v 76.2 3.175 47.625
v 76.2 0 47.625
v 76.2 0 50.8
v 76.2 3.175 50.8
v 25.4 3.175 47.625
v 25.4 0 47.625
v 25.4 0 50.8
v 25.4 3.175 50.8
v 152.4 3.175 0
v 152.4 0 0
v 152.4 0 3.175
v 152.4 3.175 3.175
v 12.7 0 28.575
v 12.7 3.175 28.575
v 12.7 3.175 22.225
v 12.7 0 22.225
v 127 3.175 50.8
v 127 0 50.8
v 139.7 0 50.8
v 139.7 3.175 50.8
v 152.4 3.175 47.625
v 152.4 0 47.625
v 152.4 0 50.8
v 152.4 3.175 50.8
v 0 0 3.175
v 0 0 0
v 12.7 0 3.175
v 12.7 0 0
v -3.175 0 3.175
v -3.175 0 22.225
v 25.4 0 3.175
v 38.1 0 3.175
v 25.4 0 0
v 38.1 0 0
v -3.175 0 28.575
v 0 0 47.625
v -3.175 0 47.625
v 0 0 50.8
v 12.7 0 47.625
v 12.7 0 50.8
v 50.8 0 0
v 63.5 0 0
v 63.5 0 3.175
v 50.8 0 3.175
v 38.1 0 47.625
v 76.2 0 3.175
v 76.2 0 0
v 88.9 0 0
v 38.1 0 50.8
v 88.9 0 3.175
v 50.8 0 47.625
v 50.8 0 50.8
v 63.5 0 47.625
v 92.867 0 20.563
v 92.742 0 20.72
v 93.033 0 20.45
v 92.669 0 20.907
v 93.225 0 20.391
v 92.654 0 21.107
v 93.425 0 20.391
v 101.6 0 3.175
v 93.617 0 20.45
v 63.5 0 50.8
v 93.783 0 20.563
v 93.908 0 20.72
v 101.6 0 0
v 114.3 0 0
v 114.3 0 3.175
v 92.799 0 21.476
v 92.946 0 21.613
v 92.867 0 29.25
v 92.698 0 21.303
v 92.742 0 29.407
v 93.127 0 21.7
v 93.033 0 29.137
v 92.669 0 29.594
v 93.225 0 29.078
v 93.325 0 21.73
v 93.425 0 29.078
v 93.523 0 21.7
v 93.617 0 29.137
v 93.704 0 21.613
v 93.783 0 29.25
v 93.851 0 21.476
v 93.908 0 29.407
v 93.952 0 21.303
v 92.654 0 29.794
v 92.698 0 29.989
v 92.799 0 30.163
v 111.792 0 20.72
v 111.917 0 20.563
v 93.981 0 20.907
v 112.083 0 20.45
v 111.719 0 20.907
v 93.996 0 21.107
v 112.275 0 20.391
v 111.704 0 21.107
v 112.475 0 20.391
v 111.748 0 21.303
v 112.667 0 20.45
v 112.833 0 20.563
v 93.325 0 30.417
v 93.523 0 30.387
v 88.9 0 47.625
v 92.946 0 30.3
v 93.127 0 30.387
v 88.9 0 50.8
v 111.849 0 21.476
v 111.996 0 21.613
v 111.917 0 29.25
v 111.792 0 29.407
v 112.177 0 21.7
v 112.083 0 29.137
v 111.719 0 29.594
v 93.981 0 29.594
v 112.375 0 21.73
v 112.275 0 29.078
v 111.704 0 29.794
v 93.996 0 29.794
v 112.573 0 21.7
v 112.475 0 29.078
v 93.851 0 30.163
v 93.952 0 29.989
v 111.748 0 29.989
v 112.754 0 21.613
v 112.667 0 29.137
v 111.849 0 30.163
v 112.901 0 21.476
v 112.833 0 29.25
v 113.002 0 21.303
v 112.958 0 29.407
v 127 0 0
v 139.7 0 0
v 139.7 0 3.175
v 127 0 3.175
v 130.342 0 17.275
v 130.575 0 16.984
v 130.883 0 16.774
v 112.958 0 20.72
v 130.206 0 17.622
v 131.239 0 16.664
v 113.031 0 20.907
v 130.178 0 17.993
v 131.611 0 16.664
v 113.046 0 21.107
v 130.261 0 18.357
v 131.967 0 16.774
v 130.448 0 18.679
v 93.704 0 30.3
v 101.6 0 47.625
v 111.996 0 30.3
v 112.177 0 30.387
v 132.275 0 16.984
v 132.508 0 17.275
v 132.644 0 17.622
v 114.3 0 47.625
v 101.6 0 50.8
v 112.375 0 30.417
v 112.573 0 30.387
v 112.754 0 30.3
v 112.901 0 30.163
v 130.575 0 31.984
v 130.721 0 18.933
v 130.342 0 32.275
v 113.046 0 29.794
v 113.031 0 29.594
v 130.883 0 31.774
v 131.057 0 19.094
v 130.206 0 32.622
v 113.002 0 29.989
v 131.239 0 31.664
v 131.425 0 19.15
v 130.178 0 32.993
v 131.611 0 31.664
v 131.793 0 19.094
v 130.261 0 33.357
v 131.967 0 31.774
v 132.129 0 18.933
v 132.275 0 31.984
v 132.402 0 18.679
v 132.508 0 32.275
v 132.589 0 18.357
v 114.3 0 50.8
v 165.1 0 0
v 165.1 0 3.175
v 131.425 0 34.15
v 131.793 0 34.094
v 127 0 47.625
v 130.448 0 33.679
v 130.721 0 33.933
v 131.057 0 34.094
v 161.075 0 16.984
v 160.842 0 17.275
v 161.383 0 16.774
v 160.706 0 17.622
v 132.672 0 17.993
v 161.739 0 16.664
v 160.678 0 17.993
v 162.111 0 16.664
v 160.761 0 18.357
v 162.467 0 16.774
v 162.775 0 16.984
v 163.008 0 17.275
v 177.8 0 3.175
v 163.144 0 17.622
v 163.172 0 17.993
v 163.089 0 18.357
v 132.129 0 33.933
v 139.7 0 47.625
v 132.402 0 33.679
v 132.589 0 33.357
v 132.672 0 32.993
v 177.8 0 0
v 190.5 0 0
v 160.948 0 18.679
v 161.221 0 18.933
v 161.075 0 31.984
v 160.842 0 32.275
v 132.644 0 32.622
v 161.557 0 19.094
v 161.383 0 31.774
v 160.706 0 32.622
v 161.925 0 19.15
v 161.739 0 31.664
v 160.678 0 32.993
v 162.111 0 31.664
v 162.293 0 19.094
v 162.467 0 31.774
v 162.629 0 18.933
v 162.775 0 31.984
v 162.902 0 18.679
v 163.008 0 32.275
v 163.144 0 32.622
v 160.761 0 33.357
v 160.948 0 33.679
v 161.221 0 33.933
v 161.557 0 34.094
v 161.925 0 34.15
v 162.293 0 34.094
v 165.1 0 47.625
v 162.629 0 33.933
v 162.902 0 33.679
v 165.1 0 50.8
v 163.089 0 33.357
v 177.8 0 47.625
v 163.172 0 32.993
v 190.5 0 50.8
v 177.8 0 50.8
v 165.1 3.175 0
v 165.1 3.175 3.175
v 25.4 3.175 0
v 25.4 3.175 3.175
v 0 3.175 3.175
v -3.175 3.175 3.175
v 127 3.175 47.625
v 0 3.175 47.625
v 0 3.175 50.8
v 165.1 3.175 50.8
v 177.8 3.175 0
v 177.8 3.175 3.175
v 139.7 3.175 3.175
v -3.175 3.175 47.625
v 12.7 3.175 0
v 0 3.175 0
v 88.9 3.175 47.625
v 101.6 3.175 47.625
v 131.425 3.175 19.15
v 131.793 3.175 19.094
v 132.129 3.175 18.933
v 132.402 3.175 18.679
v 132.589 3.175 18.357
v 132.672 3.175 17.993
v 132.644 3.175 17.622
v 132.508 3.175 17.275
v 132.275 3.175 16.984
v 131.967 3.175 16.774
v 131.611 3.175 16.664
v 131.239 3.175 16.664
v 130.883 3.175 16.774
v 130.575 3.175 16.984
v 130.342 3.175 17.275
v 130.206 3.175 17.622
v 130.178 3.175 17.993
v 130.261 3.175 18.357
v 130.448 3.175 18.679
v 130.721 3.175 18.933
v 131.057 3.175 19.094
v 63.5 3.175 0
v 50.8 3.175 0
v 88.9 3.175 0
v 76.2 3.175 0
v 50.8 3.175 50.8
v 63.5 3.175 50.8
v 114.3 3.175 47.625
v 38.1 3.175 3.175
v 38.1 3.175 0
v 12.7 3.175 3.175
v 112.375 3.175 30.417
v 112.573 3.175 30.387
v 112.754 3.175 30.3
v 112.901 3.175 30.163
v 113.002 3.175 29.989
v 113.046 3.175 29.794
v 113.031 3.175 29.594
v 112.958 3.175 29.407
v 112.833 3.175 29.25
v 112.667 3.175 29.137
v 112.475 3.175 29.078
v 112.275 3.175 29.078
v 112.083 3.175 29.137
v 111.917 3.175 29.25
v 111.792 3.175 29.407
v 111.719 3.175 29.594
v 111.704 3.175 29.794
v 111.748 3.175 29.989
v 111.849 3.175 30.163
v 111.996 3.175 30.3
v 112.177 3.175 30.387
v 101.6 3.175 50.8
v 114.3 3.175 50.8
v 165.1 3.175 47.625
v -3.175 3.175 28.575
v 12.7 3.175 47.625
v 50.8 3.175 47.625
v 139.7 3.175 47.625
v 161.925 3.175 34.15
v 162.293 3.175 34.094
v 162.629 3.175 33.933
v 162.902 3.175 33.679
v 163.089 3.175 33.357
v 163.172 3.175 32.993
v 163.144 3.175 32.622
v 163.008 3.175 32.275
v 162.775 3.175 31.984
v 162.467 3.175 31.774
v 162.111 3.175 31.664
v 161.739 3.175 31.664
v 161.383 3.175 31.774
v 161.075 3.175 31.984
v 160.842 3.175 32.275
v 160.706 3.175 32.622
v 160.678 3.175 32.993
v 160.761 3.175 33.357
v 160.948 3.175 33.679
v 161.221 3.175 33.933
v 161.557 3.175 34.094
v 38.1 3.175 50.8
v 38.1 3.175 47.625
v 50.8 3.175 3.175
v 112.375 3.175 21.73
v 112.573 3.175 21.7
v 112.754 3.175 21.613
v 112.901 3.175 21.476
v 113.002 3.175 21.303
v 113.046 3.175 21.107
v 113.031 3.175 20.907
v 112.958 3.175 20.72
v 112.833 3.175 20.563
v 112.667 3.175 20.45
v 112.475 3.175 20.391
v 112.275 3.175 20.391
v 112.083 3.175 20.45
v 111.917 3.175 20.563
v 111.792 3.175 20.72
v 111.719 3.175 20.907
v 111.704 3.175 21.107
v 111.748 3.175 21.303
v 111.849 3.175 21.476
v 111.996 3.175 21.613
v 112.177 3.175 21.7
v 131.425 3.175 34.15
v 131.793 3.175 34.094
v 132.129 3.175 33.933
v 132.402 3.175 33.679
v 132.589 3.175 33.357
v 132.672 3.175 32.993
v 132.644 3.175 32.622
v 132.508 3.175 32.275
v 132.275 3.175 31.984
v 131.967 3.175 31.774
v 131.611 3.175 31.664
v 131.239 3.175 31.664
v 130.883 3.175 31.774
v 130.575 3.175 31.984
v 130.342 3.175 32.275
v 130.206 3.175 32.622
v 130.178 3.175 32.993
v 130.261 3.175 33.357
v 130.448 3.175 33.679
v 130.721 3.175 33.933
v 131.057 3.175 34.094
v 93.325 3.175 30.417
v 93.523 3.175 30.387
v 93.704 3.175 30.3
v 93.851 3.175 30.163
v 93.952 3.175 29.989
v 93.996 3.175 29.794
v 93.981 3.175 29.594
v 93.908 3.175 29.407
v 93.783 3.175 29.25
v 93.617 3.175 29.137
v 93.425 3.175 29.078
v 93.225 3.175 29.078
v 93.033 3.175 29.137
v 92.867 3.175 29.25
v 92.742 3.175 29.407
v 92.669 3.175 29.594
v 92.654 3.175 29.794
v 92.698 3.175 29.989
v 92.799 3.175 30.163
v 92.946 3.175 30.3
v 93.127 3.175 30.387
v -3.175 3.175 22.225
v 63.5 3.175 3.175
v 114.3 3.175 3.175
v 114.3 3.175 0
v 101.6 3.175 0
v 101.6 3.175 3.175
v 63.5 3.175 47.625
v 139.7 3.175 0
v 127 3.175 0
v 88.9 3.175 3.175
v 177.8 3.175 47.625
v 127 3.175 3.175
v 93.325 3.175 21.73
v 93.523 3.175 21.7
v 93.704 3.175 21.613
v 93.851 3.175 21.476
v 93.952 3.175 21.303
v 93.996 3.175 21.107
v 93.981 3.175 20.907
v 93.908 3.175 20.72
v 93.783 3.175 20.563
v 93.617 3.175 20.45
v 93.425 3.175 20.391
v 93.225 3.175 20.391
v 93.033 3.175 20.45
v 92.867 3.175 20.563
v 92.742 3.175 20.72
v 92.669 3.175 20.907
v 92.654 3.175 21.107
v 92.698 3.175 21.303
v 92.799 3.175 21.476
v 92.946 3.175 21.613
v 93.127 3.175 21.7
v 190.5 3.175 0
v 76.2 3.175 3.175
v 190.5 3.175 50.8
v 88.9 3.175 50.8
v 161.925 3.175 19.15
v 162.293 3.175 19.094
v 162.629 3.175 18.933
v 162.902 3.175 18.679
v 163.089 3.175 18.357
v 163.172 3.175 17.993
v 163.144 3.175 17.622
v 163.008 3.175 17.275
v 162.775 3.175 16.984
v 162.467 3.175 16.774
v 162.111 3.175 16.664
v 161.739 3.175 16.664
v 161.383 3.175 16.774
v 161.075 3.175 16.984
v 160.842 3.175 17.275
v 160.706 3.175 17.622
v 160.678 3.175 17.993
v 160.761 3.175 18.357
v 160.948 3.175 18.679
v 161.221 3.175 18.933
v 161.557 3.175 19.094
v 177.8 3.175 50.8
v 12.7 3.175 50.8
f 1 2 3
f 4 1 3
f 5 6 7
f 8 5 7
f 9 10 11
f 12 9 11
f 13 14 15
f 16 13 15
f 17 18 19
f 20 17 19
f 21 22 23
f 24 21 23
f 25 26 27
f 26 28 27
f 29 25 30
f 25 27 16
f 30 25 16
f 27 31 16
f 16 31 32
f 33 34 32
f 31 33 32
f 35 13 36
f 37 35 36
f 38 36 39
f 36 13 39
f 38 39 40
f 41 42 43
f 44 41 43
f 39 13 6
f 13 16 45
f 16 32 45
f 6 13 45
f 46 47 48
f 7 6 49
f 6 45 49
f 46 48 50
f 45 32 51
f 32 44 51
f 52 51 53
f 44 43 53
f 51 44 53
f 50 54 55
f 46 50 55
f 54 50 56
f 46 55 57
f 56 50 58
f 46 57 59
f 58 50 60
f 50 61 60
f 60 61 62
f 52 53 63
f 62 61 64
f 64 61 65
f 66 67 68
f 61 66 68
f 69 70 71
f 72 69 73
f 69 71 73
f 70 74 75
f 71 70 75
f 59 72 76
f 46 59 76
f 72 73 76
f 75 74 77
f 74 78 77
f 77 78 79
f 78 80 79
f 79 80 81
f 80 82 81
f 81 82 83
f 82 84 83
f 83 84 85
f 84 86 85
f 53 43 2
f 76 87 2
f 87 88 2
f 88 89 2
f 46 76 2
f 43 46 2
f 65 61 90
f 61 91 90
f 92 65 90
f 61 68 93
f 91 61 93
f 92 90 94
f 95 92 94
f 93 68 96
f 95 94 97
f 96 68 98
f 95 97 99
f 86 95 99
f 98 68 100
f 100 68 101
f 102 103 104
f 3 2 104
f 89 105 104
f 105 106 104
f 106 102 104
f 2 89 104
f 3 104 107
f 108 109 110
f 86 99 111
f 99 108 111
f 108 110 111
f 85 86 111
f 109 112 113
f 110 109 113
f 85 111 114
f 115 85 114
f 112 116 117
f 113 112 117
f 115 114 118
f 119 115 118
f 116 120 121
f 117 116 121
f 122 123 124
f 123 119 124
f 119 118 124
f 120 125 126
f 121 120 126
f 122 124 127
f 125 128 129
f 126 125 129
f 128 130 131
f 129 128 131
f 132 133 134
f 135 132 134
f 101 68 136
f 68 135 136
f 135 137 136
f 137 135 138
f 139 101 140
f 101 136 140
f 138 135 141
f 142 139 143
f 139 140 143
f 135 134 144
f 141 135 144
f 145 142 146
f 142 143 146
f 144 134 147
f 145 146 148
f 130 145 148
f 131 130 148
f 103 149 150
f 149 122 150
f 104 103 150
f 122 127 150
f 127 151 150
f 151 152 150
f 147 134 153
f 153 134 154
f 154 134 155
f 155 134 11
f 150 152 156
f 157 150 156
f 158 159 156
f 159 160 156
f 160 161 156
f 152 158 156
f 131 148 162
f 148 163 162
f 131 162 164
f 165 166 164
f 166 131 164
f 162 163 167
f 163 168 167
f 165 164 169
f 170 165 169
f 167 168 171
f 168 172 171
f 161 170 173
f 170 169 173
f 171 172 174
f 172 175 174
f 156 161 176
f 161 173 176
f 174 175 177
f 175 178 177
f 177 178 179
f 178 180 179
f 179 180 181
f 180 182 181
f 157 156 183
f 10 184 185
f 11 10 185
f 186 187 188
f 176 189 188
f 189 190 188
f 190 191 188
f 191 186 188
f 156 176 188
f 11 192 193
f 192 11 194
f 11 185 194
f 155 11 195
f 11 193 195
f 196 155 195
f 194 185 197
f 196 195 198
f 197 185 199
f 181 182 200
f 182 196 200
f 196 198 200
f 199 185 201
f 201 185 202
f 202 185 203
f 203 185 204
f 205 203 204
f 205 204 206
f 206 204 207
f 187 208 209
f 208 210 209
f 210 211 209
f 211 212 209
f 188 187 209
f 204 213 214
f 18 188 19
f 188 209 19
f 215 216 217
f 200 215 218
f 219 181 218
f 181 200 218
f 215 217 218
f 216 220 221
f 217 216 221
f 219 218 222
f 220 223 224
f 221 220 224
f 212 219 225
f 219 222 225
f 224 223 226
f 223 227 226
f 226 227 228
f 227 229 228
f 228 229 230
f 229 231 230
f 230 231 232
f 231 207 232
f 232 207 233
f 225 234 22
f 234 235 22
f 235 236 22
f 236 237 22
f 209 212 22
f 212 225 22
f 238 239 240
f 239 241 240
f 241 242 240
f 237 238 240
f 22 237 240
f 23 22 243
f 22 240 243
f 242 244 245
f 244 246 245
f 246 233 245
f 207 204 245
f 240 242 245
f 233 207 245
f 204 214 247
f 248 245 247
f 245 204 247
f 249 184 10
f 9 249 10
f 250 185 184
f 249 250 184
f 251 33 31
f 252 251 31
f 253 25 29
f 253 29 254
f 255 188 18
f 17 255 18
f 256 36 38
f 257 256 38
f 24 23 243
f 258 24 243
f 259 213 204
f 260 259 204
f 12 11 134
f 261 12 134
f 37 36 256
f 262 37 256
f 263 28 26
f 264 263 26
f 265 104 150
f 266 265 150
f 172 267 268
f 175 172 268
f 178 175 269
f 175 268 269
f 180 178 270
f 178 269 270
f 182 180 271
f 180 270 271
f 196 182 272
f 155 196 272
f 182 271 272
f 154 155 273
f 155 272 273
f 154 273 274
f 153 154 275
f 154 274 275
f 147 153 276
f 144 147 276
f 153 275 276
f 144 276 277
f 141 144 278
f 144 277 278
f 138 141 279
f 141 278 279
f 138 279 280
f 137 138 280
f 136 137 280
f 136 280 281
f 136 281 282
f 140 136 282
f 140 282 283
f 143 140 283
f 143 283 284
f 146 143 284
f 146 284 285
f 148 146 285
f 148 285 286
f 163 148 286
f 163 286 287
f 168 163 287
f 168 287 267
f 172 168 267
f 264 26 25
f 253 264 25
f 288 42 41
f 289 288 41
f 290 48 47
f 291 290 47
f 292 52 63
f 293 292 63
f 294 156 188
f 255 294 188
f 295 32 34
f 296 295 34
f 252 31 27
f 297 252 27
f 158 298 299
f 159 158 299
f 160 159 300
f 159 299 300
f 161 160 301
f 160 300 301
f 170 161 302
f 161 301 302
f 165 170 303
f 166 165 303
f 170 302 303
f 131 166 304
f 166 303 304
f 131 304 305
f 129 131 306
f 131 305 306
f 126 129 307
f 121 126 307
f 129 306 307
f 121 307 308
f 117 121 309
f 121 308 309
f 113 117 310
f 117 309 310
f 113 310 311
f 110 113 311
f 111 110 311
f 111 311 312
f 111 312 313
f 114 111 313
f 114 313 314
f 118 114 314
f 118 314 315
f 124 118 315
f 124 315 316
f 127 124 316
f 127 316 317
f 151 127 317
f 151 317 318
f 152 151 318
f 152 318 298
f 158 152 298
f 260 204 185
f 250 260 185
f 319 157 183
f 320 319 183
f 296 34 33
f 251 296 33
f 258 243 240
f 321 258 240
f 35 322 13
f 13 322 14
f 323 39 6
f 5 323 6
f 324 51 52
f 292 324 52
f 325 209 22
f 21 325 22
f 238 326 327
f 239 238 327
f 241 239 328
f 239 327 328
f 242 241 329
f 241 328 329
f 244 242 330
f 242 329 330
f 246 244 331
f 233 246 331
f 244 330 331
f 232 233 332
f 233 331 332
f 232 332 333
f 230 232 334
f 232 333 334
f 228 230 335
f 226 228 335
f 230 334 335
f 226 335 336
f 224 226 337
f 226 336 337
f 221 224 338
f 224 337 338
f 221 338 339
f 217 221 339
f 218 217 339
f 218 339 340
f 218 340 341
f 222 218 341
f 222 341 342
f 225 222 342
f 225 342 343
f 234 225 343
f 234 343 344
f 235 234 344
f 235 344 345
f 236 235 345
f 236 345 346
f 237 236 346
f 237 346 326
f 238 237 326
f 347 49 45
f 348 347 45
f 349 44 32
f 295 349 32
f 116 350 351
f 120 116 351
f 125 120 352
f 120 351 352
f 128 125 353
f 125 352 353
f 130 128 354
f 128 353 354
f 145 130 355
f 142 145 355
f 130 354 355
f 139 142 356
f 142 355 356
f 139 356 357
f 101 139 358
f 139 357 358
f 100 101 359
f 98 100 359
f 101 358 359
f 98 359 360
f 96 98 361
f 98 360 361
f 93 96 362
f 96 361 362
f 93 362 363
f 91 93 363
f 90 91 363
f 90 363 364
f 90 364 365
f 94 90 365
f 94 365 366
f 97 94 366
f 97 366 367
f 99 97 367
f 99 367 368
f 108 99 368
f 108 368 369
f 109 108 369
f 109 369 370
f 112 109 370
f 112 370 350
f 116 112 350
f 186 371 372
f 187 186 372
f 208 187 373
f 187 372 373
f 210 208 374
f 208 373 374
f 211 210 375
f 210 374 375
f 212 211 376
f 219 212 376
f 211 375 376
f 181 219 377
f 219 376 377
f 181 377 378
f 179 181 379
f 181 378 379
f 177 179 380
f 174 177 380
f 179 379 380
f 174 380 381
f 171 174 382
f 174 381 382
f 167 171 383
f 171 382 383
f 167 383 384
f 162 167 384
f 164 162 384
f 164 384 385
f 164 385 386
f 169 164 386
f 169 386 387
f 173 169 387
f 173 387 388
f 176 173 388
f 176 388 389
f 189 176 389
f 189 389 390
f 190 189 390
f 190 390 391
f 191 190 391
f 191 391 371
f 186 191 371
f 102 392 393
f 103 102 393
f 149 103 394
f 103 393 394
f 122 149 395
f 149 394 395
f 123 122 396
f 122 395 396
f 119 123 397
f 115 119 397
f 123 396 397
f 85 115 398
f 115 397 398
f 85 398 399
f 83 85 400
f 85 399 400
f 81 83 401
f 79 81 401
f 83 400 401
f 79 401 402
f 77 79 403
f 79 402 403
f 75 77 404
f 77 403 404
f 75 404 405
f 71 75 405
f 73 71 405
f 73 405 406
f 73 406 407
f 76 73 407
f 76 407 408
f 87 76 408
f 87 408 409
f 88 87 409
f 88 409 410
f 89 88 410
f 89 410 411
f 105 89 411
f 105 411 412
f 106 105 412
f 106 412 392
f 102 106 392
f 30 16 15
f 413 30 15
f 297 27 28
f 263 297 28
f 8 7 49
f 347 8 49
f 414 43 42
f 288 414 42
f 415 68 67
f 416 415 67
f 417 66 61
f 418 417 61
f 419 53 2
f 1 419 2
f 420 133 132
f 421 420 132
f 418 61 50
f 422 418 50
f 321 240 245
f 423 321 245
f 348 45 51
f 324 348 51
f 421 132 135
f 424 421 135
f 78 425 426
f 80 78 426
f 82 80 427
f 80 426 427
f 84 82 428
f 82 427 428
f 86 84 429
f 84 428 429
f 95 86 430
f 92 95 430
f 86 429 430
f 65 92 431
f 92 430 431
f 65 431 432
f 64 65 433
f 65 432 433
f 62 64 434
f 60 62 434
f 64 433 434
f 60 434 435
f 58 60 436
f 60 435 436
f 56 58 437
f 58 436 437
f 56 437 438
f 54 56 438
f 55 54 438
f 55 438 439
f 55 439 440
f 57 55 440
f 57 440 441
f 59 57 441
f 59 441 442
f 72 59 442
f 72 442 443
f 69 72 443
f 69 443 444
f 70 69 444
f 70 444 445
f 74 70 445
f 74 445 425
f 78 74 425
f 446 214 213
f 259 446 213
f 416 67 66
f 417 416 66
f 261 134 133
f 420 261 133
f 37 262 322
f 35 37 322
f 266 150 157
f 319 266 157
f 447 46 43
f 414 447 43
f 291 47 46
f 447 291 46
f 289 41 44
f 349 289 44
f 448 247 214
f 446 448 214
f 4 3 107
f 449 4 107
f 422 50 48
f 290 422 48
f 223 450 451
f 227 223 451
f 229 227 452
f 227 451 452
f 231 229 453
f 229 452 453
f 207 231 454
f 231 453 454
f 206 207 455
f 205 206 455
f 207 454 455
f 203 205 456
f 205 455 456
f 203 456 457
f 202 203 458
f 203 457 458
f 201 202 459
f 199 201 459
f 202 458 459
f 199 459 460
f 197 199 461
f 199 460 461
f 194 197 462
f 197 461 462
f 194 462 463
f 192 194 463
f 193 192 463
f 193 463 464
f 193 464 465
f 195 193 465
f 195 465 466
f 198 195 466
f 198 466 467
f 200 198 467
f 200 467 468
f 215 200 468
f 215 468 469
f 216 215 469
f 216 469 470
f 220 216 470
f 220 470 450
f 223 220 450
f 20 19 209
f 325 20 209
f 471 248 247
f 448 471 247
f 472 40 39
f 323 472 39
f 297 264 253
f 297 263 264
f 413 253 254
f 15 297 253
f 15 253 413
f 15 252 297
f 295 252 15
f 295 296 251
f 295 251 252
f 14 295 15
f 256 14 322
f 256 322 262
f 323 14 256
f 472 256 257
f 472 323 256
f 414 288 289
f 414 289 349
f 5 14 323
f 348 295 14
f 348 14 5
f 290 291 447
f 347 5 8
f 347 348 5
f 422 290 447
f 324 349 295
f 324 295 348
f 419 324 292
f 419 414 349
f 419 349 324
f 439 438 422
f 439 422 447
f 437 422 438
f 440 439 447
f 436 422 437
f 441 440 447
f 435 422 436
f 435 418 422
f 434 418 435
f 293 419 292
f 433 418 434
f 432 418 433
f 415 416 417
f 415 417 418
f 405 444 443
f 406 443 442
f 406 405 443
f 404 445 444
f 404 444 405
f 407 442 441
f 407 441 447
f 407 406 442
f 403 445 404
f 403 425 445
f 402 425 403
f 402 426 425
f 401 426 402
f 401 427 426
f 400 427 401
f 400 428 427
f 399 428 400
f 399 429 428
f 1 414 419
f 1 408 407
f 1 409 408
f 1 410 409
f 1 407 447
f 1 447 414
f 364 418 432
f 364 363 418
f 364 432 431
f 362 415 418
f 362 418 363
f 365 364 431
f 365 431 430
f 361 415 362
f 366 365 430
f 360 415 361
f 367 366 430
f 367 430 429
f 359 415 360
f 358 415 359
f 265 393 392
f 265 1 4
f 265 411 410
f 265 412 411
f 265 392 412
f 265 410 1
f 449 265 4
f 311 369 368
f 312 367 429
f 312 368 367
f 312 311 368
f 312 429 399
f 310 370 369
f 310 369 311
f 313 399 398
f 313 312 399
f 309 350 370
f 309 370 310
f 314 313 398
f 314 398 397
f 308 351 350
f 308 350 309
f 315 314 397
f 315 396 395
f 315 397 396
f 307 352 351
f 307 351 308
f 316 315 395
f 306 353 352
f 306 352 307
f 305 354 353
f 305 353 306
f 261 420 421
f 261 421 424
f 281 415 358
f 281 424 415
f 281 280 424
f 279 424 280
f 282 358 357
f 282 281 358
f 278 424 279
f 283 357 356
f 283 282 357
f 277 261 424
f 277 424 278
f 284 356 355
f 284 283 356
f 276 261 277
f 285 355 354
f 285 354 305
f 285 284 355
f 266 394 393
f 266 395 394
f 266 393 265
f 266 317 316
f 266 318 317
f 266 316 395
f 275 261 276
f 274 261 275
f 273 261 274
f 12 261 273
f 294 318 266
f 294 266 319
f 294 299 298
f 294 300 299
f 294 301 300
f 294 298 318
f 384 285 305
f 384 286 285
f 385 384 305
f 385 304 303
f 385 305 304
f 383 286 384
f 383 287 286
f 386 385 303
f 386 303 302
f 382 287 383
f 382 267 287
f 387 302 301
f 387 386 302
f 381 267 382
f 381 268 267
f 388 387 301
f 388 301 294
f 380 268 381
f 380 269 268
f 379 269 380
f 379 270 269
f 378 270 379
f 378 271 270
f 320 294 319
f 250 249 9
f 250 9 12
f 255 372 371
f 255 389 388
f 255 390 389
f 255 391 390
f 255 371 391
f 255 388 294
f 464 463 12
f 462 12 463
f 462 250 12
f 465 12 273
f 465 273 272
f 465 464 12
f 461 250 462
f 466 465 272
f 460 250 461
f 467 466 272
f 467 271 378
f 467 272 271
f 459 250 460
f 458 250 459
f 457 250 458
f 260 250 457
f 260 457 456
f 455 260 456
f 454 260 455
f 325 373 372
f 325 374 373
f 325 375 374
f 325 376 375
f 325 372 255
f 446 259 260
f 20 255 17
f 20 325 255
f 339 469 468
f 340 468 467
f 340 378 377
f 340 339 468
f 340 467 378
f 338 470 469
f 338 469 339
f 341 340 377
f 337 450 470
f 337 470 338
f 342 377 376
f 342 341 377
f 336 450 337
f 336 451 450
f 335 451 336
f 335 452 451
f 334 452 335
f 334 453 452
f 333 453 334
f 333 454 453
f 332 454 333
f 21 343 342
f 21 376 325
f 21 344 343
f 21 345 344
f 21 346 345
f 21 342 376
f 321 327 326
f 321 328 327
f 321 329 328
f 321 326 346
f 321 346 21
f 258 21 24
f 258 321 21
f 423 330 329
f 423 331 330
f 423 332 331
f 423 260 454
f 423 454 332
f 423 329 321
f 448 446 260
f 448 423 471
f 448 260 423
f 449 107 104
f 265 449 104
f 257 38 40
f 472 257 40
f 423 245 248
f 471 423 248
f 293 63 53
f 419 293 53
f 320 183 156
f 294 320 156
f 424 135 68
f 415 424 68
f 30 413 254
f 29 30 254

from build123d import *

# Parameters (mm, degrees)
BOSS_EXTRUDE1_DEPTH = 3.175
SKETCH2_W           = 12.7
SKETCH2_H           = 6.35
CUT_EXTRUDE1_DEPTH  = 198.182581951
SKETCH3_W           = 19.05
SKETCH3_H           = 3.175
BOSS_EXTRUDE2_DEPTH = 6.35
SKETCH5_R           = 1.25
SKETCH5_R_2         = 0.6731
CUT_EXTRUDE3_DEPTH  = 198.182581951
SKETCH6_W           = 3.175
SKETCH6_H           = 44.45
CUT_EXTRUDE4_DEPTH  = 198.182581951


with BuildPart() as part:
    # Sketch1 → Boss-Extrude1 (new body)
    with BuildSketch(Plane(origin=(0, 0, 0), x_dir=(1, 0, 0), z_dir=(0, 1, 0))):
        Polygon((12.7, 0), (0, 0), (0, -50.8), (12.7, -50.8), (12.7, -47.625), (25.4, -47.625), (25.4, -50.8), (38.1, -50.8), (38.1, -47.625), (50.8, -47.625), (50.8, -50.8), (63.5, -50.8), (63.5, -47.625), (76.2, -47.625), (76.2, -50.8), (88.9, -50.8), (88.9, -47.625), (101.6, -47.625), (101.6, -50.8), (114.3, -50.8), (114.3, -47.625), (127, -47.625), (127, -50.8), (139.7, -50.8), (139.7, -47.625), (152.4, -47.625), (152.4, -50.8), (165.1, -50.8), (165.1, -47.625), (177.8, -47.625), (177.8, -50.8), (190.5, -50.8), (190.5, 0), (177.8, 0), (177.8, -3.175), (165.1, -3.175), (165.1, 0), (152.4, 0), (152.4, -3.175), (139.7, -3.175), (139.7, 0), (127, 0), (127, -3.175), (114.3, -3.175), (114.3, 0), (101.6, 0), (101.6, -3.175), (88.9, -3.175), (88.9, 0), (76.2, 0), (76.2, -3.175), (63.5, -3.175), (63.5, 0), (50.8, 0), (50.8, -3.175), (38.1, -3.175), (38.1, 0), (25.4, 0), (25.4, -3.175), (12.7, -3.175), align=None)
    extrude(amount=BOSS_EXTRUDE1_DEPTH)

    # Sketch2 → Cut-Extrude1 (cut, through all)
    with BuildSketch(Plane(origin=(0, 3.175, 0), x_dir=(1, 0, 0), z_dir=(0, 1, 0))):
        with Locations((6.35, -25.4)):
            Rectangle(SKETCH2_W, SKETCH2_H)
    extrude(amount=-CUT_EXTRUDE1_DEPTH, mode=Mode.SUBTRACT)

    # Sketch3 → Boss-Extrude2 (add)
    with BuildSketch(Plane.ZY):
        with Locations((12.7, 1.5875)):
            Rectangle(SKETCH3_W, SKETCH3_H)
        with Locations((38.1, 1.5875)):
            Rectangle(SKETCH3_W, SKETCH3_H)
    extrude(amount=BOSS_EXTRUDE2_DEPTH)

    # Sketch5 → Cut-Extrude3 (cut, through all)
    with BuildSketch(Plane(origin=(0, 3.175, 0), x_dir=(1, 0, 0), z_dir=(0, 1, 0))):
        with Locations(Location((131.425, -17.9, 0), (0, 0, 270))):
            Circle(SKETCH5_R)
        with Locations(Location((131.425, -32.9, 0), (0, 0, 270))):
            Circle(SKETCH5_R)
        with Locations(Location((112.375, -21.0566, 0), (0, 0, 270))):
            Circle(SKETCH5_R_2)
        with Locations(Location((112.375, -29.7434, 0), (0, 0, 270))):
            Circle(SKETCH5_R_2)
        with Locations(Location((93.325, -29.7434, 0), (0, 0, 270))):
            Circle(SKETCH5_R_2)
        with Locations(Location((93.325, -21.0566, 0), (0, 0, 270))):
            Circle(SKETCH5_R_2)
        with Locations(Location((161.925, -32.9, 0), (0, 0, 270))):
            Circle(SKETCH5_R)
        with Locations(Location((161.925, -17.9, 0), (0, 0, 270))):
            Circle(SKETCH5_R)
    extrude(amount=-CUT_EXTRUDE3_DEPTH, mode=Mode.SUBTRACT)

    # Sketch6 → Cut-Extrude4 (cut, through all)
    with BuildSketch(Plane(origin=(0, 3.175, 0), x_dir=(1, 0, 0), z_dir=(0, 1, 0))):
        with Locations((-4.7625, -25.4)):
            Rectangle(SKETCH6_W, SKETCH6_H)
    extrude(amount=-CUT_EXTRUDE4_DEPTH, mode=Mode.SUBTRACT)


solid = part.part
